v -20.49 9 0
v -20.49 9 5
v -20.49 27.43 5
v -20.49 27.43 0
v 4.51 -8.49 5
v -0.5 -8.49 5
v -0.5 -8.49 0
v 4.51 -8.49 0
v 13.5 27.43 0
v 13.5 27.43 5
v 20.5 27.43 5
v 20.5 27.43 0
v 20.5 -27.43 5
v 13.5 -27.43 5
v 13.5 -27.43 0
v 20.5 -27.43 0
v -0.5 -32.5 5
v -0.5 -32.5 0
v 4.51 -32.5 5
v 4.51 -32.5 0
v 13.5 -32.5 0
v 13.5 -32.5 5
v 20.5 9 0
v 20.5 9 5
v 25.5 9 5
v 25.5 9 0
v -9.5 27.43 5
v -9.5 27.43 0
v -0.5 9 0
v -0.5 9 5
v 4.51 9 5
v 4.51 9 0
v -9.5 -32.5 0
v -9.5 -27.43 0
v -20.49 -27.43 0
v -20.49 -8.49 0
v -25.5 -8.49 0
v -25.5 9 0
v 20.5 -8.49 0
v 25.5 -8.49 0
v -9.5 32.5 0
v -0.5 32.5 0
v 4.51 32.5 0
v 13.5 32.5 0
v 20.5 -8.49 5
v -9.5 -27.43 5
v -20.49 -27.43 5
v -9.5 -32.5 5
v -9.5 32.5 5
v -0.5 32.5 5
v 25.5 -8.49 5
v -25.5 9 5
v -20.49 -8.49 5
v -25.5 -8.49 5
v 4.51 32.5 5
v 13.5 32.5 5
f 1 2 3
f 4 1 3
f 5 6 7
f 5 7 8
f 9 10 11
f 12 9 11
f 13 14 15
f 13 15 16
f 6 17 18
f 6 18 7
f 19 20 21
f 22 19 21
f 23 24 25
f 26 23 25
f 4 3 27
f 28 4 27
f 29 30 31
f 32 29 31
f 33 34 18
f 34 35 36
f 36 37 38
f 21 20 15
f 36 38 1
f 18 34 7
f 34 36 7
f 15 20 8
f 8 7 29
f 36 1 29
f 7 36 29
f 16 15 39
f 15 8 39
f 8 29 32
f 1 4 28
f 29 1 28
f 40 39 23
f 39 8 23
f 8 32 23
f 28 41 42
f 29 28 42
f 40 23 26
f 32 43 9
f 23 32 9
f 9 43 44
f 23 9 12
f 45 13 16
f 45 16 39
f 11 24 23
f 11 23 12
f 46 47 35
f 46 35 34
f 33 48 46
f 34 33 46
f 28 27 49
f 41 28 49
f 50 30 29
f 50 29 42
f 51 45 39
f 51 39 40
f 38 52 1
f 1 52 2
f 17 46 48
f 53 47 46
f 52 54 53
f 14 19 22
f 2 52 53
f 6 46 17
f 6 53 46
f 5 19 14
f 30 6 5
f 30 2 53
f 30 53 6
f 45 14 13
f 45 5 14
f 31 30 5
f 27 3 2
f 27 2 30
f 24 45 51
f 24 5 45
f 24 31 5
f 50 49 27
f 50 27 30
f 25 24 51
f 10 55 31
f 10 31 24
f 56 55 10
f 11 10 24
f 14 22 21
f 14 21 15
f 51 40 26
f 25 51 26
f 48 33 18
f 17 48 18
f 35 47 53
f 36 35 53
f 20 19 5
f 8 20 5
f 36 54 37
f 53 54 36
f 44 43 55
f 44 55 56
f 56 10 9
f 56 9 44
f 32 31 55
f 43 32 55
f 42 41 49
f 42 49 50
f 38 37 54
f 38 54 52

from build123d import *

# Parameters (mm, degrees)
ESQUISSE1_W             = 51
ESQUISSE1_H             = 65
BOSS_EXTRU_1_DEPTH      = 5
ESQUISSE2_W             = 5.01
ESQUISSE2_H             = 23.5
ESQUISSE2_H_2           = 24.01
ESQUISSE2_W_2           = 5
ENL_V_MAT_EXTRU_1_DEPTH = 5
ESQUISSE3_W             = 16
ESQUISSE3_H             = 5.07
ESQUISSE3_W_2           = 12
ENL_V_MAT_EXTRU_2_DEPTH = 5


with BuildPart() as part:
    # Esquisse1 → Boss.-Extru.1 (new body)
    with BuildSketch(Plane.XY):
        Rectangle(ESQUISSE1_W, ESQUISSE1_H)
    extrude(amount=BOSS_EXTRU_1_DEPTH)

    # Esquisse2 → Enlèv. mat.-Extru.1 (cut)
    with BuildSketch(Plane.XY.offset(5)):
        with Locations((-22.995, 20.75)):
            Rectangle(ESQUISSE2_W, ESQUISSE2_H)
        with Locations((-22.995, -20.495)):
            Rectangle(ESQUISSE2_W, ESQUISSE2_H_2)
        with Locations((2.005, 20.75)):
            Rectangle(ESQUISSE2_W, ESQUISSE2_H)
        with Locations((2.005, -20.495)):
            Rectangle(ESQUISSE2_W, ESQUISSE2_H_2)
        with Locations((23, 20.75)):
            Rectangle(ESQUISSE2_W_2, ESQUISSE2_H)
        with Locations((23, -20.495)):
            Rectangle(ESQUISSE2_W_2, ESQUISSE2_H_2)
    extrude(amount=-ENL_V_MAT_EXTRU_1_DEPTH, mode=Mode.SUBTRACT)

    # Esquisse3 → Enlèv. mat.-Extru.2 (cut)
    with BuildSketch(Plane.XY.offset(5)):
        with Locations((-17.5, 29.965)):
            Rectangle(ESQUISSE3_W, ESQUISSE3_H)
        with Locations((19.5, 29.965)):
            Rectangle(ESQUISSE3_W_2, ESQUISSE3_H)
        with Locations((19.5, -29.965)):
            Rectangle(ESQUISSE3_W_2, ESQUISSE3_H)
        with Locations((-17.5, -29.965)):
            Rectangle(ESQUISSE3_W, ESQUISSE3_H)
    extrude(amount=-ENL_V_MAT_EXTRU_2_DEPTH, mode=Mode.SUBTRACT)


solid = part.part
